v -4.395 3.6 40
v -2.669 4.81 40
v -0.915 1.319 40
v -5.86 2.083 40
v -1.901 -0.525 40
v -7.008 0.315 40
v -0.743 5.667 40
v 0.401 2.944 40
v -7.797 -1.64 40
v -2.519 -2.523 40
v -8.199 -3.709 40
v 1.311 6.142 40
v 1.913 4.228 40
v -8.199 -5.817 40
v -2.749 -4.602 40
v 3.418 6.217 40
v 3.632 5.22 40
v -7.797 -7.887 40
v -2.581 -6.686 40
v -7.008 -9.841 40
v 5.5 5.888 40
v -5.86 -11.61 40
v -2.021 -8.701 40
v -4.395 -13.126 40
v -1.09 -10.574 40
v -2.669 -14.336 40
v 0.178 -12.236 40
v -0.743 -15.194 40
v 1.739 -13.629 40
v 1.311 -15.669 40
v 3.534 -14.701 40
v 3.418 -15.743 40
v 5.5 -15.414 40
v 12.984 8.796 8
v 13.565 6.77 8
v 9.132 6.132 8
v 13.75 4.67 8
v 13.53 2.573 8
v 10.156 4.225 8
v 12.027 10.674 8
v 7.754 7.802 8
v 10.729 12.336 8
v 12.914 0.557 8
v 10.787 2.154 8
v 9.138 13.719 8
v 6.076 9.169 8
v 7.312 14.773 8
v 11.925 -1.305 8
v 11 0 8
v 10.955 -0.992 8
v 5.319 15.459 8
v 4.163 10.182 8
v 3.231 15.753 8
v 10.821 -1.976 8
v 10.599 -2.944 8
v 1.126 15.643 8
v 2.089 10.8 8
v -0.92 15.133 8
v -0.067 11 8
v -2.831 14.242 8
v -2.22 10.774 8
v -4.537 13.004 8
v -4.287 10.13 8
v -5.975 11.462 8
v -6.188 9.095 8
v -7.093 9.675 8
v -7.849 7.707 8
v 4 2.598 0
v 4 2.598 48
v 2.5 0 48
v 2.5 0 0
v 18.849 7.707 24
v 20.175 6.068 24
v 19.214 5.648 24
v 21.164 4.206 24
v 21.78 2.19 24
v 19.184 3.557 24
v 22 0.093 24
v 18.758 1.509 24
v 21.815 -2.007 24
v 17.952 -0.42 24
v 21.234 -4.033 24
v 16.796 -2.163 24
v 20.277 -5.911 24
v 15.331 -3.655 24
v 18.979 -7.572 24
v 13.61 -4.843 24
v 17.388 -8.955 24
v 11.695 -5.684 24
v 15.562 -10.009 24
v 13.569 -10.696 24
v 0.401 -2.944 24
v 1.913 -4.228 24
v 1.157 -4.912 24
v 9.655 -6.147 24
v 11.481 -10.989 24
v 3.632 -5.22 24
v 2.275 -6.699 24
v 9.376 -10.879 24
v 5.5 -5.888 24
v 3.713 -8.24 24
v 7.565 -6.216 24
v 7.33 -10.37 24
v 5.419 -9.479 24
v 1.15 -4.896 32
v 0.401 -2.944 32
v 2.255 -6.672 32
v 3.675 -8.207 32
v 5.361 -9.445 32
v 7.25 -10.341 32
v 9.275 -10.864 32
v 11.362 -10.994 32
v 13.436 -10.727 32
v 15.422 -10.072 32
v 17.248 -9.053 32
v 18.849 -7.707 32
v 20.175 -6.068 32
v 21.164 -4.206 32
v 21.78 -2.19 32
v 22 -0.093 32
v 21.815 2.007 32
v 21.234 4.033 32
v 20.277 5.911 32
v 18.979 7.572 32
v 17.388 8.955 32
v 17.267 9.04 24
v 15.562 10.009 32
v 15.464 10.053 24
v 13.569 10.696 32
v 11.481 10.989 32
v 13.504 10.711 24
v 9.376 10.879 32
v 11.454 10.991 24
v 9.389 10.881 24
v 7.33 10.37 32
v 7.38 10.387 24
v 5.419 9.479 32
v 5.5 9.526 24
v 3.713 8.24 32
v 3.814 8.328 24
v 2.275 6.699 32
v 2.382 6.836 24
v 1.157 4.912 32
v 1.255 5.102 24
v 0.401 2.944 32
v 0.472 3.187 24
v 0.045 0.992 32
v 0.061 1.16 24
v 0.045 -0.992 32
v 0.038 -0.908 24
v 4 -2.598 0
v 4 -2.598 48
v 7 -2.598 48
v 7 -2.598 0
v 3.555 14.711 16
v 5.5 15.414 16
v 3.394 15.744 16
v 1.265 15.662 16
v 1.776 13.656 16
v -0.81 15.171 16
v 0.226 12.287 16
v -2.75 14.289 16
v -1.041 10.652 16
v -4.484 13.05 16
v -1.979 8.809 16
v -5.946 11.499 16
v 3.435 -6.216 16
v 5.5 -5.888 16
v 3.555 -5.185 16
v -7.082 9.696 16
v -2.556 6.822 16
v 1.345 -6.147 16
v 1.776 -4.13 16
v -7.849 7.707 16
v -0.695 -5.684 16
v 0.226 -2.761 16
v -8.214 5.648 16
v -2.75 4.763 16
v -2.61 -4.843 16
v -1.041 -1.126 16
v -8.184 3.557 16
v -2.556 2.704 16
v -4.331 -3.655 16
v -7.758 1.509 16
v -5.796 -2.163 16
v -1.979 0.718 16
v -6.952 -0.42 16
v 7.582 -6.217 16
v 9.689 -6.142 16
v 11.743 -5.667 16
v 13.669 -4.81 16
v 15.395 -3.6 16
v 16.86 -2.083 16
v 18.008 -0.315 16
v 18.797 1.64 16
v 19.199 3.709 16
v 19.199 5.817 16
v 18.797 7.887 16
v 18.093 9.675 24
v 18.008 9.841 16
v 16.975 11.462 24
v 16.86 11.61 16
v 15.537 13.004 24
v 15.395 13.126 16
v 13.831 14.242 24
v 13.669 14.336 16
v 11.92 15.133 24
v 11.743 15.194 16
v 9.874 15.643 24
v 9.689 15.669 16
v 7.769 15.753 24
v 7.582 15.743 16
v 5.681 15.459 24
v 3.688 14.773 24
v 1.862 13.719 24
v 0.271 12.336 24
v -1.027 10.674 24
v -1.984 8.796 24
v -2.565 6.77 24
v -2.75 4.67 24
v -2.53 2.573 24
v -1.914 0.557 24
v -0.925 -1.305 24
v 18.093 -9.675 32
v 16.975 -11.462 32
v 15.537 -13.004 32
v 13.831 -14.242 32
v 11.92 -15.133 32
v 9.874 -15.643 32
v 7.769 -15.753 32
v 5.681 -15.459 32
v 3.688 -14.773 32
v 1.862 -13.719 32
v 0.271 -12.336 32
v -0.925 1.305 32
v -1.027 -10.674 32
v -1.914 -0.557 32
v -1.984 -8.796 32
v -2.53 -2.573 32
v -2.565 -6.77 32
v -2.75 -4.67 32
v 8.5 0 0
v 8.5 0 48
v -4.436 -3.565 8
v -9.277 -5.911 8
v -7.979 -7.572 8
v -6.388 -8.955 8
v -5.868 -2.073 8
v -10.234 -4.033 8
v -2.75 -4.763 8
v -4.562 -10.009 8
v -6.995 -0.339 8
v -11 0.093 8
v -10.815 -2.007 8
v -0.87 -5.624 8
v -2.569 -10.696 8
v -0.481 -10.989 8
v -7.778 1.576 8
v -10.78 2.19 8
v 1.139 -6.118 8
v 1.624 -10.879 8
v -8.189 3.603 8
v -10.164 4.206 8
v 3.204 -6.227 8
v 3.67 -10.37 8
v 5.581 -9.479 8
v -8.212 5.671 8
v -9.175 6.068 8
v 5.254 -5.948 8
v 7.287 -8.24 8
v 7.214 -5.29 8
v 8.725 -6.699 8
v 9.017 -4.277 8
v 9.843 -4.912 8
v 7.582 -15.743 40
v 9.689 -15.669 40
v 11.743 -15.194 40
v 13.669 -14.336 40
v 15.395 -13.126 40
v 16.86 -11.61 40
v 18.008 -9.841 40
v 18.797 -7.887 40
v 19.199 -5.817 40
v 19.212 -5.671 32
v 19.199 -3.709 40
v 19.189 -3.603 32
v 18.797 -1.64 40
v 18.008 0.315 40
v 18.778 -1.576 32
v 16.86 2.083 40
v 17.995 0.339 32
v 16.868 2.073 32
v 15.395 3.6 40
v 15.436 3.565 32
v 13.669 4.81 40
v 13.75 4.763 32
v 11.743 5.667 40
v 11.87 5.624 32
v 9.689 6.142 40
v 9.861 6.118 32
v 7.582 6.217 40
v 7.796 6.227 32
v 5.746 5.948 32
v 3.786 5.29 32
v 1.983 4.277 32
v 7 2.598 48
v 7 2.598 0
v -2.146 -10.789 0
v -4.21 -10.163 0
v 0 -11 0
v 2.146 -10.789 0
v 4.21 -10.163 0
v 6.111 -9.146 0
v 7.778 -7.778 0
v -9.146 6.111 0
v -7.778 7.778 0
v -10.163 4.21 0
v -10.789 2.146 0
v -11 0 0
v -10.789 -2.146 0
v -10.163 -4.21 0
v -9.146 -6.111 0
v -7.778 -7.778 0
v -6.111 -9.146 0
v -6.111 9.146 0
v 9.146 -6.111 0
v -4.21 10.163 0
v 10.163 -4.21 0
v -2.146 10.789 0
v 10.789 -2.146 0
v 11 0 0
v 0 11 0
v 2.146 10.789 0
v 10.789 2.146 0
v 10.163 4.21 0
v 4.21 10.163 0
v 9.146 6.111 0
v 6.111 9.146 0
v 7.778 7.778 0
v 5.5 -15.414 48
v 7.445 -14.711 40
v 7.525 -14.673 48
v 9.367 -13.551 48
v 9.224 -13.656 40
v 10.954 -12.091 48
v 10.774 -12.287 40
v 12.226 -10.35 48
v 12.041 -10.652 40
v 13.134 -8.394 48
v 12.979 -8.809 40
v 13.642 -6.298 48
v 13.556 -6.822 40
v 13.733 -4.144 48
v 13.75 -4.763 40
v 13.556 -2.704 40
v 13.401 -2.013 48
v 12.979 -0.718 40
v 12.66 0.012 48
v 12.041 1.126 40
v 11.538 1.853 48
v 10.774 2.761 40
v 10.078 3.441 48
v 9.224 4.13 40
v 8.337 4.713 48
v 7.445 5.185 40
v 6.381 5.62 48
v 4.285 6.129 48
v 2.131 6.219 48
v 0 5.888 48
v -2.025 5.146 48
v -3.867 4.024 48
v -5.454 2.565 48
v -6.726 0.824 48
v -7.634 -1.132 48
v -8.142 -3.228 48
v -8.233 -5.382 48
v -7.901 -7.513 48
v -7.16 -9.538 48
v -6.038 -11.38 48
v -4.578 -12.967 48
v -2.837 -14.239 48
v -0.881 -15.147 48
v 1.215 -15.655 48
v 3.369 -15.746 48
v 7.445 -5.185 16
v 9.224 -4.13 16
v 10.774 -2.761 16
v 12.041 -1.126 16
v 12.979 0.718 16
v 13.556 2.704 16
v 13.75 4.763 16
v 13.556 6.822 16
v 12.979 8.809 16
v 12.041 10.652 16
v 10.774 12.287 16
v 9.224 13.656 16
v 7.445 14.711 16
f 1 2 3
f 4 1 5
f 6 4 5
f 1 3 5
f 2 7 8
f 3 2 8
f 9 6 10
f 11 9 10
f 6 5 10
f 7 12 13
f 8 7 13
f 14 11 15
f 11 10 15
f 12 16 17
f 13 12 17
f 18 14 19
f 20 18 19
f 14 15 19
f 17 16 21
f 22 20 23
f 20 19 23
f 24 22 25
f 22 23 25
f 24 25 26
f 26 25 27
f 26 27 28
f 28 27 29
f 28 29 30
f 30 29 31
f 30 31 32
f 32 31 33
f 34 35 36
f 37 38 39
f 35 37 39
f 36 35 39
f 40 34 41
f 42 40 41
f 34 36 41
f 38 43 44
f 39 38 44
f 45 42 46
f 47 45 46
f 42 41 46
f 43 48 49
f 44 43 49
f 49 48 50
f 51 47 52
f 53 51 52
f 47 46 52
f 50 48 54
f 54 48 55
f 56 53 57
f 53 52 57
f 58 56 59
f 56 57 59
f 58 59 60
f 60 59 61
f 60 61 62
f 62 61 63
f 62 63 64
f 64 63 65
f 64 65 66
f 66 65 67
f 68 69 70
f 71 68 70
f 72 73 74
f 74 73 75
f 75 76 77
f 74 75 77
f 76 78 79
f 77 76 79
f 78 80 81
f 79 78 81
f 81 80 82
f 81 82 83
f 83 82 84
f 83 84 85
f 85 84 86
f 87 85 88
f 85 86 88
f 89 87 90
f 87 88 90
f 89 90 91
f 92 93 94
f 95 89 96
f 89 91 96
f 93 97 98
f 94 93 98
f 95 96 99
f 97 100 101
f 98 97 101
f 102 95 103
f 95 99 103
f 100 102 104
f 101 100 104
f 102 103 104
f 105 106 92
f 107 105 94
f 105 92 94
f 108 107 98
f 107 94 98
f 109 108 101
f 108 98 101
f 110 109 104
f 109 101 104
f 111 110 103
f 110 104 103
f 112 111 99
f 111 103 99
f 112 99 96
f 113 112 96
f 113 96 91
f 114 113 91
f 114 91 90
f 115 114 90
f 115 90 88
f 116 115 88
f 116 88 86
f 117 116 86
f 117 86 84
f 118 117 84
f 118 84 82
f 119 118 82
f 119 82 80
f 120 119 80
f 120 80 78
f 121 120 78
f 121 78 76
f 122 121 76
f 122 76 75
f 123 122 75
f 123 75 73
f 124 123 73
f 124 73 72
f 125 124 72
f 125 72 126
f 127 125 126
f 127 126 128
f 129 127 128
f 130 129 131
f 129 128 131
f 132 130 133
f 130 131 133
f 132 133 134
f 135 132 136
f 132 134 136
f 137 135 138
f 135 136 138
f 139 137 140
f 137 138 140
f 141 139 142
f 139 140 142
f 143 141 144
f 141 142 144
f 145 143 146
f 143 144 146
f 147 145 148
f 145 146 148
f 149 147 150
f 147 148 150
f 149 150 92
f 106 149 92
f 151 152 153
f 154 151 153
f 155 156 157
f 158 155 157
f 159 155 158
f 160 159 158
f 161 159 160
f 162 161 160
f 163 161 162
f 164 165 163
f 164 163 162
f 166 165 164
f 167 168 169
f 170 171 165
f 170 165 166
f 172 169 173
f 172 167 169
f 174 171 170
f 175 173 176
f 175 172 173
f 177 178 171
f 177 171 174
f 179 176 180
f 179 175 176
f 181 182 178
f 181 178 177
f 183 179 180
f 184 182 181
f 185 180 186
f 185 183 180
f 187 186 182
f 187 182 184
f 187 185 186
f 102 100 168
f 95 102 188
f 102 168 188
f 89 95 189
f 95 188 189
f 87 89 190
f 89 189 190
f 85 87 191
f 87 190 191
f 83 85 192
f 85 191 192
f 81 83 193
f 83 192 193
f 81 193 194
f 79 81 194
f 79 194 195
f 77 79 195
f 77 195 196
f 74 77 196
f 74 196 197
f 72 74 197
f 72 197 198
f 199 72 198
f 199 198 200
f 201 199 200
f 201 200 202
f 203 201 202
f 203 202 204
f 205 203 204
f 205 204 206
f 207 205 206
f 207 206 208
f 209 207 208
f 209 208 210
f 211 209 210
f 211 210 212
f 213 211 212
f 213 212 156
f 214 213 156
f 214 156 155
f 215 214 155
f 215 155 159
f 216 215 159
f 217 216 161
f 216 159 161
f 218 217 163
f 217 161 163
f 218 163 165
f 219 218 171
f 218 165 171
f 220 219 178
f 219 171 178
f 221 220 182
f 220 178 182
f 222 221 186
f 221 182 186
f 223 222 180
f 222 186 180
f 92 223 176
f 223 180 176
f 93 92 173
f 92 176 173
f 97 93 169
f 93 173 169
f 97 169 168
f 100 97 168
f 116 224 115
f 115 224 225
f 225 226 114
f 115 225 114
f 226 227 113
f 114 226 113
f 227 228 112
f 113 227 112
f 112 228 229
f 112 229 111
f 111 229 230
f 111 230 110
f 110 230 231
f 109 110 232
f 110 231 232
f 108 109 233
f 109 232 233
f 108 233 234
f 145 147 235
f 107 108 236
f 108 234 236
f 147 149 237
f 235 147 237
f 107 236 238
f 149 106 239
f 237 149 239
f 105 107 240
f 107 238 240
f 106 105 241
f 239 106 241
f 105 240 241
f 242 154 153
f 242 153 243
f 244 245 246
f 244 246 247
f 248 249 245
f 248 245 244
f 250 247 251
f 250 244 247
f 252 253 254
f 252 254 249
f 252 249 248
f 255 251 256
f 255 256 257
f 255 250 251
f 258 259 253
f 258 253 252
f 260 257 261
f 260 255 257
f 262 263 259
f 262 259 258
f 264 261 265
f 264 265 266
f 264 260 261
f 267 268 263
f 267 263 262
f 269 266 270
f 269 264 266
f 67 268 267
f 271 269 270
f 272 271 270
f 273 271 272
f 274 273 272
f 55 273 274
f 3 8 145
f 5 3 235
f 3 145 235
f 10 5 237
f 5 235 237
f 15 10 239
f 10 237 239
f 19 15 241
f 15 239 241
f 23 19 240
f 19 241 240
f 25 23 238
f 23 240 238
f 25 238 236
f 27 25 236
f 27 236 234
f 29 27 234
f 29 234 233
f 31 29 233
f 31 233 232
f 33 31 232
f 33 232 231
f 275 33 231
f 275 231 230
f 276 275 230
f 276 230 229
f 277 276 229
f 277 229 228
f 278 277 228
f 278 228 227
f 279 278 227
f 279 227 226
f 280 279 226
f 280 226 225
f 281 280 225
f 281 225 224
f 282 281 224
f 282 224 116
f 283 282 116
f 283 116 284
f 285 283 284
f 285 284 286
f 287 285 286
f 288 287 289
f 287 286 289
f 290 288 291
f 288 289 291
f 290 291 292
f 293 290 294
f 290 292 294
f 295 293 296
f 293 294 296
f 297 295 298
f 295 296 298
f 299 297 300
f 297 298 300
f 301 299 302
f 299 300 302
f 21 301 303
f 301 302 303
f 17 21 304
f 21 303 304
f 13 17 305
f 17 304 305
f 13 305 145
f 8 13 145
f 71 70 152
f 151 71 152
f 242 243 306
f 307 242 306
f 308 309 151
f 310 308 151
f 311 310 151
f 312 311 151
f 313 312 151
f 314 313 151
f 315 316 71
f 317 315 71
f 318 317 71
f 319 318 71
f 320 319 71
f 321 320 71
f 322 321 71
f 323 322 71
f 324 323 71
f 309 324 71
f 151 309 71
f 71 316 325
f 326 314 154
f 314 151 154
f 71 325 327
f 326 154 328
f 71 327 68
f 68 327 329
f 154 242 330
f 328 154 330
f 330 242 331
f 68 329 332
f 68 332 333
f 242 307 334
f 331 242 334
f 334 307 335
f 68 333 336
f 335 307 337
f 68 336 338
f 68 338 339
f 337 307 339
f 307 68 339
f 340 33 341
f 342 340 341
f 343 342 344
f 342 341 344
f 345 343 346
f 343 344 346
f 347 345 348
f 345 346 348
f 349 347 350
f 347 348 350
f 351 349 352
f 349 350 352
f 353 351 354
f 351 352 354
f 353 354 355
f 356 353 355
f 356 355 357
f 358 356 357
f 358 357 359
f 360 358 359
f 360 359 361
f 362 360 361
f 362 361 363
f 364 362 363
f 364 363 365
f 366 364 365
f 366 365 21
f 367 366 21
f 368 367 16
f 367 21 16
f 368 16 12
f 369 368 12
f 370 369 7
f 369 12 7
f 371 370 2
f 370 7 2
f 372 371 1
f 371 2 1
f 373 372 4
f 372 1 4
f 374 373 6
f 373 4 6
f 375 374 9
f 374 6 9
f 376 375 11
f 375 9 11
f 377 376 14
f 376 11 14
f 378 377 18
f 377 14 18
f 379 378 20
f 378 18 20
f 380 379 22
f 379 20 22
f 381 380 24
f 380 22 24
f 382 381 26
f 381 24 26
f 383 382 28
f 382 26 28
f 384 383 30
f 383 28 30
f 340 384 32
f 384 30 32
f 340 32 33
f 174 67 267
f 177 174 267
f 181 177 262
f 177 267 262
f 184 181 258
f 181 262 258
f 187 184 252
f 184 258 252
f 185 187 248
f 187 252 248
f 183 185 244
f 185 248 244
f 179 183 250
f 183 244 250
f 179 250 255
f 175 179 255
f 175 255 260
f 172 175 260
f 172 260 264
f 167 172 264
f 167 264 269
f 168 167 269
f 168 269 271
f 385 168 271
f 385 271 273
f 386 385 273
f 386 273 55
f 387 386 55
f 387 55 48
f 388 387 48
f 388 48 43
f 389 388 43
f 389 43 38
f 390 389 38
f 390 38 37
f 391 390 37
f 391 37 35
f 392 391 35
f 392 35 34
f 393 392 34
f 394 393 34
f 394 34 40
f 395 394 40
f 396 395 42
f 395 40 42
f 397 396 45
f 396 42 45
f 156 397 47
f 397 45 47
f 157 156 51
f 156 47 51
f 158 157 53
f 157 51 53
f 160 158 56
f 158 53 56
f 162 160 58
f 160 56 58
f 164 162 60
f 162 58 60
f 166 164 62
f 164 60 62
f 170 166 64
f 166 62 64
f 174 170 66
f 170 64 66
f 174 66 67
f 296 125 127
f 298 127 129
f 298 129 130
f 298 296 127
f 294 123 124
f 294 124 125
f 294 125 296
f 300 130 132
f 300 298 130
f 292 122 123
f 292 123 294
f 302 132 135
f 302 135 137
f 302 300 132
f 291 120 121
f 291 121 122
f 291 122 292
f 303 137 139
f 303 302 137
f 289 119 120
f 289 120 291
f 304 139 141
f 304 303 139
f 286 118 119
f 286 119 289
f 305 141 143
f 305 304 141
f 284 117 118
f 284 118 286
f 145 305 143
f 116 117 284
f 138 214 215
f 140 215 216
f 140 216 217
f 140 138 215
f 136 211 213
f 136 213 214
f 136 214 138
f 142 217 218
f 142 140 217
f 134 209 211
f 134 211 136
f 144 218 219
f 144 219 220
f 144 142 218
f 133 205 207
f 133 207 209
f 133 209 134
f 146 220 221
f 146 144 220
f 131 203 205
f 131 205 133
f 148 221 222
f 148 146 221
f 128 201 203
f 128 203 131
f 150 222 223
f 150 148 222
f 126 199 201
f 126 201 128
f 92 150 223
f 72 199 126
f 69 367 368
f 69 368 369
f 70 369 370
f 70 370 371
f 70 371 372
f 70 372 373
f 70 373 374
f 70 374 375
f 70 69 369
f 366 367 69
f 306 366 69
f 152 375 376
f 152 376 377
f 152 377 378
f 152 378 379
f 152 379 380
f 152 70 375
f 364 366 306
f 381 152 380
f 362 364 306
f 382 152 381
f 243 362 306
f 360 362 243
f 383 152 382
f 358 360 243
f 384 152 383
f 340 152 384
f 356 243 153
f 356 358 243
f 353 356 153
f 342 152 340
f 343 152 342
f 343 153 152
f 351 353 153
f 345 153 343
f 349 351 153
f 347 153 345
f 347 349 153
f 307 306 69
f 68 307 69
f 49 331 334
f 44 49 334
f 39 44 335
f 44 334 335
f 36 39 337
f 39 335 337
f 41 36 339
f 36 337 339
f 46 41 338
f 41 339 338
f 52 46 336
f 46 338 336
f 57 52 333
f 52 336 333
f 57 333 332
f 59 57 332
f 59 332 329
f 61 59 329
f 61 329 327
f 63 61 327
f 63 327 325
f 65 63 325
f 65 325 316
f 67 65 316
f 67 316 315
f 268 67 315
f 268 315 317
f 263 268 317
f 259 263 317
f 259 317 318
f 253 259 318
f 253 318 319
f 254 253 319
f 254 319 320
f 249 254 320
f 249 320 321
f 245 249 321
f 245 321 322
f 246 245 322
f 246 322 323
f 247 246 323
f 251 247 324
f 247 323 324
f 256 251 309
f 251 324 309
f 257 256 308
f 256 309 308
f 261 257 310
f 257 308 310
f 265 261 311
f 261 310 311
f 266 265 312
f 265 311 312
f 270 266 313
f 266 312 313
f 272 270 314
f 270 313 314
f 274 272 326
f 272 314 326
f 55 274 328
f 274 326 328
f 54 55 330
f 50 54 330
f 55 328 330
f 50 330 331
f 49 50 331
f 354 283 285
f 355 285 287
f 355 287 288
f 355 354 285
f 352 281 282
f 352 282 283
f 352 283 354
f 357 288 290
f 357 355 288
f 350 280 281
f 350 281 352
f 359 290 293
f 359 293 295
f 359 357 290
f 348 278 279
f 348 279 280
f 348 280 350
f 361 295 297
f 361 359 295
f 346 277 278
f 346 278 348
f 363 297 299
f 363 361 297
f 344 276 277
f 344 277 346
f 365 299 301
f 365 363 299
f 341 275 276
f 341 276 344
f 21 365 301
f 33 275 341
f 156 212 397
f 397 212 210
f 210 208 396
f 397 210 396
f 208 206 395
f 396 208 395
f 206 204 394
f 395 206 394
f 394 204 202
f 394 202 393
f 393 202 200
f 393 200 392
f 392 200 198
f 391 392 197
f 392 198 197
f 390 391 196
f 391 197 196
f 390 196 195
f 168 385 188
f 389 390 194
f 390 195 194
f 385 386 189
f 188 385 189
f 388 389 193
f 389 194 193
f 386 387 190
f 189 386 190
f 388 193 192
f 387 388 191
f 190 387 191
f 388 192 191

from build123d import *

# Parameters (mm, degrees)
SKETCH1_R           = 11
BOSS_EXTRUDE1_DEPTH = 8
SKETCH3_R           = 11
BOSS_EXTRUDE2_DEPTH = 8
SKETCH4_R           = 11
BOSS_EXTRUDE4_DEPTH = 8
SKETCH5_R           = 11
BOSS_EXTRUDE5_DEPTH = 8
SKETCH6_R           = 11
BOSS_EXTRUDE6_DEPTH = 8
SKETCH8_R           = 11
BOSS_EXTRUDE7_DEPTH = 8
CUT_EXTRUDE1_DEPTH  = 48


with BuildPart() as part:
    # Sketch1 → Boss-Extrude1 (new body)
    with BuildSketch(Plane.XY):
        Circle(SKETCH1_R)
    extrude(amount=BOSS_EXTRUDE1_DEPTH)

    # Sketch3 → Boss-Extrude2 (add)
    with BuildSketch(Plane.XY.offset(8)):
        with Locations(Location((2.75, 4.763139721, 0), (0, 0, 164.477512186))):
            Circle(SKETCH3_R)
    extrude(amount=BOSS_EXTRUDE2_DEPTH)

    # Sketch4 → Boss-Extrude4 (add)
    with BuildSketch(Plane.XY.offset(16)):
        with Locations(Location((8.25, 4.763139721, 0), (0, 0, 255.522487814))):
            Circle(SKETCH4_R)
    extrude(amount=BOSS_EXTRUDE4_DEPTH)

    # Sketch5 → Boss-Extrude5 (add)
    with BuildSketch(Plane.XY.offset(24)):
        with Locations(Location((11, 0, 0), (0, 0, 195.522487814))):
            Circle(SKETCH5_R)
    extrude(amount=BOSS_EXTRUDE5_DEPTH)

    # Sketch6 → Boss-Extrude6 (add)
    with BuildSketch(Plane.XY.offset(32)):
        with Locations(Location((8.25, -4.763139721, 0), (0, 0, 135.522487814))):
            Circle(SKETCH6_R)
    extrude(amount=BOSS_EXTRUDE6_DEPTH)

    # Sketch8 → Boss-Extrude7 (add)
    with BuildSketch(Plane.XY.offset(40)):
        with Locations(Location((2.75, -4.763139721, 0), (0, 0, 284.477512186))):
            Circle(SKETCH8_R)
    extrude(amount=BOSS_EXTRUDE7_DEPTH)

    # Sketch9 → Cut-Extrude1 (cut)
    with BuildSketch(Plane.XY.offset(48)):
        Polygon((8.5, 0), (7, 2.598076211), (4, 2.598076211), (2.5, 0), (4, -2.598076211), (7, -2.598076211), align=None)
    extrude(amount=-CUT_EXTRUDE1_DEPTH, mode=Mode.SUBTRACT)


solid = part.part
